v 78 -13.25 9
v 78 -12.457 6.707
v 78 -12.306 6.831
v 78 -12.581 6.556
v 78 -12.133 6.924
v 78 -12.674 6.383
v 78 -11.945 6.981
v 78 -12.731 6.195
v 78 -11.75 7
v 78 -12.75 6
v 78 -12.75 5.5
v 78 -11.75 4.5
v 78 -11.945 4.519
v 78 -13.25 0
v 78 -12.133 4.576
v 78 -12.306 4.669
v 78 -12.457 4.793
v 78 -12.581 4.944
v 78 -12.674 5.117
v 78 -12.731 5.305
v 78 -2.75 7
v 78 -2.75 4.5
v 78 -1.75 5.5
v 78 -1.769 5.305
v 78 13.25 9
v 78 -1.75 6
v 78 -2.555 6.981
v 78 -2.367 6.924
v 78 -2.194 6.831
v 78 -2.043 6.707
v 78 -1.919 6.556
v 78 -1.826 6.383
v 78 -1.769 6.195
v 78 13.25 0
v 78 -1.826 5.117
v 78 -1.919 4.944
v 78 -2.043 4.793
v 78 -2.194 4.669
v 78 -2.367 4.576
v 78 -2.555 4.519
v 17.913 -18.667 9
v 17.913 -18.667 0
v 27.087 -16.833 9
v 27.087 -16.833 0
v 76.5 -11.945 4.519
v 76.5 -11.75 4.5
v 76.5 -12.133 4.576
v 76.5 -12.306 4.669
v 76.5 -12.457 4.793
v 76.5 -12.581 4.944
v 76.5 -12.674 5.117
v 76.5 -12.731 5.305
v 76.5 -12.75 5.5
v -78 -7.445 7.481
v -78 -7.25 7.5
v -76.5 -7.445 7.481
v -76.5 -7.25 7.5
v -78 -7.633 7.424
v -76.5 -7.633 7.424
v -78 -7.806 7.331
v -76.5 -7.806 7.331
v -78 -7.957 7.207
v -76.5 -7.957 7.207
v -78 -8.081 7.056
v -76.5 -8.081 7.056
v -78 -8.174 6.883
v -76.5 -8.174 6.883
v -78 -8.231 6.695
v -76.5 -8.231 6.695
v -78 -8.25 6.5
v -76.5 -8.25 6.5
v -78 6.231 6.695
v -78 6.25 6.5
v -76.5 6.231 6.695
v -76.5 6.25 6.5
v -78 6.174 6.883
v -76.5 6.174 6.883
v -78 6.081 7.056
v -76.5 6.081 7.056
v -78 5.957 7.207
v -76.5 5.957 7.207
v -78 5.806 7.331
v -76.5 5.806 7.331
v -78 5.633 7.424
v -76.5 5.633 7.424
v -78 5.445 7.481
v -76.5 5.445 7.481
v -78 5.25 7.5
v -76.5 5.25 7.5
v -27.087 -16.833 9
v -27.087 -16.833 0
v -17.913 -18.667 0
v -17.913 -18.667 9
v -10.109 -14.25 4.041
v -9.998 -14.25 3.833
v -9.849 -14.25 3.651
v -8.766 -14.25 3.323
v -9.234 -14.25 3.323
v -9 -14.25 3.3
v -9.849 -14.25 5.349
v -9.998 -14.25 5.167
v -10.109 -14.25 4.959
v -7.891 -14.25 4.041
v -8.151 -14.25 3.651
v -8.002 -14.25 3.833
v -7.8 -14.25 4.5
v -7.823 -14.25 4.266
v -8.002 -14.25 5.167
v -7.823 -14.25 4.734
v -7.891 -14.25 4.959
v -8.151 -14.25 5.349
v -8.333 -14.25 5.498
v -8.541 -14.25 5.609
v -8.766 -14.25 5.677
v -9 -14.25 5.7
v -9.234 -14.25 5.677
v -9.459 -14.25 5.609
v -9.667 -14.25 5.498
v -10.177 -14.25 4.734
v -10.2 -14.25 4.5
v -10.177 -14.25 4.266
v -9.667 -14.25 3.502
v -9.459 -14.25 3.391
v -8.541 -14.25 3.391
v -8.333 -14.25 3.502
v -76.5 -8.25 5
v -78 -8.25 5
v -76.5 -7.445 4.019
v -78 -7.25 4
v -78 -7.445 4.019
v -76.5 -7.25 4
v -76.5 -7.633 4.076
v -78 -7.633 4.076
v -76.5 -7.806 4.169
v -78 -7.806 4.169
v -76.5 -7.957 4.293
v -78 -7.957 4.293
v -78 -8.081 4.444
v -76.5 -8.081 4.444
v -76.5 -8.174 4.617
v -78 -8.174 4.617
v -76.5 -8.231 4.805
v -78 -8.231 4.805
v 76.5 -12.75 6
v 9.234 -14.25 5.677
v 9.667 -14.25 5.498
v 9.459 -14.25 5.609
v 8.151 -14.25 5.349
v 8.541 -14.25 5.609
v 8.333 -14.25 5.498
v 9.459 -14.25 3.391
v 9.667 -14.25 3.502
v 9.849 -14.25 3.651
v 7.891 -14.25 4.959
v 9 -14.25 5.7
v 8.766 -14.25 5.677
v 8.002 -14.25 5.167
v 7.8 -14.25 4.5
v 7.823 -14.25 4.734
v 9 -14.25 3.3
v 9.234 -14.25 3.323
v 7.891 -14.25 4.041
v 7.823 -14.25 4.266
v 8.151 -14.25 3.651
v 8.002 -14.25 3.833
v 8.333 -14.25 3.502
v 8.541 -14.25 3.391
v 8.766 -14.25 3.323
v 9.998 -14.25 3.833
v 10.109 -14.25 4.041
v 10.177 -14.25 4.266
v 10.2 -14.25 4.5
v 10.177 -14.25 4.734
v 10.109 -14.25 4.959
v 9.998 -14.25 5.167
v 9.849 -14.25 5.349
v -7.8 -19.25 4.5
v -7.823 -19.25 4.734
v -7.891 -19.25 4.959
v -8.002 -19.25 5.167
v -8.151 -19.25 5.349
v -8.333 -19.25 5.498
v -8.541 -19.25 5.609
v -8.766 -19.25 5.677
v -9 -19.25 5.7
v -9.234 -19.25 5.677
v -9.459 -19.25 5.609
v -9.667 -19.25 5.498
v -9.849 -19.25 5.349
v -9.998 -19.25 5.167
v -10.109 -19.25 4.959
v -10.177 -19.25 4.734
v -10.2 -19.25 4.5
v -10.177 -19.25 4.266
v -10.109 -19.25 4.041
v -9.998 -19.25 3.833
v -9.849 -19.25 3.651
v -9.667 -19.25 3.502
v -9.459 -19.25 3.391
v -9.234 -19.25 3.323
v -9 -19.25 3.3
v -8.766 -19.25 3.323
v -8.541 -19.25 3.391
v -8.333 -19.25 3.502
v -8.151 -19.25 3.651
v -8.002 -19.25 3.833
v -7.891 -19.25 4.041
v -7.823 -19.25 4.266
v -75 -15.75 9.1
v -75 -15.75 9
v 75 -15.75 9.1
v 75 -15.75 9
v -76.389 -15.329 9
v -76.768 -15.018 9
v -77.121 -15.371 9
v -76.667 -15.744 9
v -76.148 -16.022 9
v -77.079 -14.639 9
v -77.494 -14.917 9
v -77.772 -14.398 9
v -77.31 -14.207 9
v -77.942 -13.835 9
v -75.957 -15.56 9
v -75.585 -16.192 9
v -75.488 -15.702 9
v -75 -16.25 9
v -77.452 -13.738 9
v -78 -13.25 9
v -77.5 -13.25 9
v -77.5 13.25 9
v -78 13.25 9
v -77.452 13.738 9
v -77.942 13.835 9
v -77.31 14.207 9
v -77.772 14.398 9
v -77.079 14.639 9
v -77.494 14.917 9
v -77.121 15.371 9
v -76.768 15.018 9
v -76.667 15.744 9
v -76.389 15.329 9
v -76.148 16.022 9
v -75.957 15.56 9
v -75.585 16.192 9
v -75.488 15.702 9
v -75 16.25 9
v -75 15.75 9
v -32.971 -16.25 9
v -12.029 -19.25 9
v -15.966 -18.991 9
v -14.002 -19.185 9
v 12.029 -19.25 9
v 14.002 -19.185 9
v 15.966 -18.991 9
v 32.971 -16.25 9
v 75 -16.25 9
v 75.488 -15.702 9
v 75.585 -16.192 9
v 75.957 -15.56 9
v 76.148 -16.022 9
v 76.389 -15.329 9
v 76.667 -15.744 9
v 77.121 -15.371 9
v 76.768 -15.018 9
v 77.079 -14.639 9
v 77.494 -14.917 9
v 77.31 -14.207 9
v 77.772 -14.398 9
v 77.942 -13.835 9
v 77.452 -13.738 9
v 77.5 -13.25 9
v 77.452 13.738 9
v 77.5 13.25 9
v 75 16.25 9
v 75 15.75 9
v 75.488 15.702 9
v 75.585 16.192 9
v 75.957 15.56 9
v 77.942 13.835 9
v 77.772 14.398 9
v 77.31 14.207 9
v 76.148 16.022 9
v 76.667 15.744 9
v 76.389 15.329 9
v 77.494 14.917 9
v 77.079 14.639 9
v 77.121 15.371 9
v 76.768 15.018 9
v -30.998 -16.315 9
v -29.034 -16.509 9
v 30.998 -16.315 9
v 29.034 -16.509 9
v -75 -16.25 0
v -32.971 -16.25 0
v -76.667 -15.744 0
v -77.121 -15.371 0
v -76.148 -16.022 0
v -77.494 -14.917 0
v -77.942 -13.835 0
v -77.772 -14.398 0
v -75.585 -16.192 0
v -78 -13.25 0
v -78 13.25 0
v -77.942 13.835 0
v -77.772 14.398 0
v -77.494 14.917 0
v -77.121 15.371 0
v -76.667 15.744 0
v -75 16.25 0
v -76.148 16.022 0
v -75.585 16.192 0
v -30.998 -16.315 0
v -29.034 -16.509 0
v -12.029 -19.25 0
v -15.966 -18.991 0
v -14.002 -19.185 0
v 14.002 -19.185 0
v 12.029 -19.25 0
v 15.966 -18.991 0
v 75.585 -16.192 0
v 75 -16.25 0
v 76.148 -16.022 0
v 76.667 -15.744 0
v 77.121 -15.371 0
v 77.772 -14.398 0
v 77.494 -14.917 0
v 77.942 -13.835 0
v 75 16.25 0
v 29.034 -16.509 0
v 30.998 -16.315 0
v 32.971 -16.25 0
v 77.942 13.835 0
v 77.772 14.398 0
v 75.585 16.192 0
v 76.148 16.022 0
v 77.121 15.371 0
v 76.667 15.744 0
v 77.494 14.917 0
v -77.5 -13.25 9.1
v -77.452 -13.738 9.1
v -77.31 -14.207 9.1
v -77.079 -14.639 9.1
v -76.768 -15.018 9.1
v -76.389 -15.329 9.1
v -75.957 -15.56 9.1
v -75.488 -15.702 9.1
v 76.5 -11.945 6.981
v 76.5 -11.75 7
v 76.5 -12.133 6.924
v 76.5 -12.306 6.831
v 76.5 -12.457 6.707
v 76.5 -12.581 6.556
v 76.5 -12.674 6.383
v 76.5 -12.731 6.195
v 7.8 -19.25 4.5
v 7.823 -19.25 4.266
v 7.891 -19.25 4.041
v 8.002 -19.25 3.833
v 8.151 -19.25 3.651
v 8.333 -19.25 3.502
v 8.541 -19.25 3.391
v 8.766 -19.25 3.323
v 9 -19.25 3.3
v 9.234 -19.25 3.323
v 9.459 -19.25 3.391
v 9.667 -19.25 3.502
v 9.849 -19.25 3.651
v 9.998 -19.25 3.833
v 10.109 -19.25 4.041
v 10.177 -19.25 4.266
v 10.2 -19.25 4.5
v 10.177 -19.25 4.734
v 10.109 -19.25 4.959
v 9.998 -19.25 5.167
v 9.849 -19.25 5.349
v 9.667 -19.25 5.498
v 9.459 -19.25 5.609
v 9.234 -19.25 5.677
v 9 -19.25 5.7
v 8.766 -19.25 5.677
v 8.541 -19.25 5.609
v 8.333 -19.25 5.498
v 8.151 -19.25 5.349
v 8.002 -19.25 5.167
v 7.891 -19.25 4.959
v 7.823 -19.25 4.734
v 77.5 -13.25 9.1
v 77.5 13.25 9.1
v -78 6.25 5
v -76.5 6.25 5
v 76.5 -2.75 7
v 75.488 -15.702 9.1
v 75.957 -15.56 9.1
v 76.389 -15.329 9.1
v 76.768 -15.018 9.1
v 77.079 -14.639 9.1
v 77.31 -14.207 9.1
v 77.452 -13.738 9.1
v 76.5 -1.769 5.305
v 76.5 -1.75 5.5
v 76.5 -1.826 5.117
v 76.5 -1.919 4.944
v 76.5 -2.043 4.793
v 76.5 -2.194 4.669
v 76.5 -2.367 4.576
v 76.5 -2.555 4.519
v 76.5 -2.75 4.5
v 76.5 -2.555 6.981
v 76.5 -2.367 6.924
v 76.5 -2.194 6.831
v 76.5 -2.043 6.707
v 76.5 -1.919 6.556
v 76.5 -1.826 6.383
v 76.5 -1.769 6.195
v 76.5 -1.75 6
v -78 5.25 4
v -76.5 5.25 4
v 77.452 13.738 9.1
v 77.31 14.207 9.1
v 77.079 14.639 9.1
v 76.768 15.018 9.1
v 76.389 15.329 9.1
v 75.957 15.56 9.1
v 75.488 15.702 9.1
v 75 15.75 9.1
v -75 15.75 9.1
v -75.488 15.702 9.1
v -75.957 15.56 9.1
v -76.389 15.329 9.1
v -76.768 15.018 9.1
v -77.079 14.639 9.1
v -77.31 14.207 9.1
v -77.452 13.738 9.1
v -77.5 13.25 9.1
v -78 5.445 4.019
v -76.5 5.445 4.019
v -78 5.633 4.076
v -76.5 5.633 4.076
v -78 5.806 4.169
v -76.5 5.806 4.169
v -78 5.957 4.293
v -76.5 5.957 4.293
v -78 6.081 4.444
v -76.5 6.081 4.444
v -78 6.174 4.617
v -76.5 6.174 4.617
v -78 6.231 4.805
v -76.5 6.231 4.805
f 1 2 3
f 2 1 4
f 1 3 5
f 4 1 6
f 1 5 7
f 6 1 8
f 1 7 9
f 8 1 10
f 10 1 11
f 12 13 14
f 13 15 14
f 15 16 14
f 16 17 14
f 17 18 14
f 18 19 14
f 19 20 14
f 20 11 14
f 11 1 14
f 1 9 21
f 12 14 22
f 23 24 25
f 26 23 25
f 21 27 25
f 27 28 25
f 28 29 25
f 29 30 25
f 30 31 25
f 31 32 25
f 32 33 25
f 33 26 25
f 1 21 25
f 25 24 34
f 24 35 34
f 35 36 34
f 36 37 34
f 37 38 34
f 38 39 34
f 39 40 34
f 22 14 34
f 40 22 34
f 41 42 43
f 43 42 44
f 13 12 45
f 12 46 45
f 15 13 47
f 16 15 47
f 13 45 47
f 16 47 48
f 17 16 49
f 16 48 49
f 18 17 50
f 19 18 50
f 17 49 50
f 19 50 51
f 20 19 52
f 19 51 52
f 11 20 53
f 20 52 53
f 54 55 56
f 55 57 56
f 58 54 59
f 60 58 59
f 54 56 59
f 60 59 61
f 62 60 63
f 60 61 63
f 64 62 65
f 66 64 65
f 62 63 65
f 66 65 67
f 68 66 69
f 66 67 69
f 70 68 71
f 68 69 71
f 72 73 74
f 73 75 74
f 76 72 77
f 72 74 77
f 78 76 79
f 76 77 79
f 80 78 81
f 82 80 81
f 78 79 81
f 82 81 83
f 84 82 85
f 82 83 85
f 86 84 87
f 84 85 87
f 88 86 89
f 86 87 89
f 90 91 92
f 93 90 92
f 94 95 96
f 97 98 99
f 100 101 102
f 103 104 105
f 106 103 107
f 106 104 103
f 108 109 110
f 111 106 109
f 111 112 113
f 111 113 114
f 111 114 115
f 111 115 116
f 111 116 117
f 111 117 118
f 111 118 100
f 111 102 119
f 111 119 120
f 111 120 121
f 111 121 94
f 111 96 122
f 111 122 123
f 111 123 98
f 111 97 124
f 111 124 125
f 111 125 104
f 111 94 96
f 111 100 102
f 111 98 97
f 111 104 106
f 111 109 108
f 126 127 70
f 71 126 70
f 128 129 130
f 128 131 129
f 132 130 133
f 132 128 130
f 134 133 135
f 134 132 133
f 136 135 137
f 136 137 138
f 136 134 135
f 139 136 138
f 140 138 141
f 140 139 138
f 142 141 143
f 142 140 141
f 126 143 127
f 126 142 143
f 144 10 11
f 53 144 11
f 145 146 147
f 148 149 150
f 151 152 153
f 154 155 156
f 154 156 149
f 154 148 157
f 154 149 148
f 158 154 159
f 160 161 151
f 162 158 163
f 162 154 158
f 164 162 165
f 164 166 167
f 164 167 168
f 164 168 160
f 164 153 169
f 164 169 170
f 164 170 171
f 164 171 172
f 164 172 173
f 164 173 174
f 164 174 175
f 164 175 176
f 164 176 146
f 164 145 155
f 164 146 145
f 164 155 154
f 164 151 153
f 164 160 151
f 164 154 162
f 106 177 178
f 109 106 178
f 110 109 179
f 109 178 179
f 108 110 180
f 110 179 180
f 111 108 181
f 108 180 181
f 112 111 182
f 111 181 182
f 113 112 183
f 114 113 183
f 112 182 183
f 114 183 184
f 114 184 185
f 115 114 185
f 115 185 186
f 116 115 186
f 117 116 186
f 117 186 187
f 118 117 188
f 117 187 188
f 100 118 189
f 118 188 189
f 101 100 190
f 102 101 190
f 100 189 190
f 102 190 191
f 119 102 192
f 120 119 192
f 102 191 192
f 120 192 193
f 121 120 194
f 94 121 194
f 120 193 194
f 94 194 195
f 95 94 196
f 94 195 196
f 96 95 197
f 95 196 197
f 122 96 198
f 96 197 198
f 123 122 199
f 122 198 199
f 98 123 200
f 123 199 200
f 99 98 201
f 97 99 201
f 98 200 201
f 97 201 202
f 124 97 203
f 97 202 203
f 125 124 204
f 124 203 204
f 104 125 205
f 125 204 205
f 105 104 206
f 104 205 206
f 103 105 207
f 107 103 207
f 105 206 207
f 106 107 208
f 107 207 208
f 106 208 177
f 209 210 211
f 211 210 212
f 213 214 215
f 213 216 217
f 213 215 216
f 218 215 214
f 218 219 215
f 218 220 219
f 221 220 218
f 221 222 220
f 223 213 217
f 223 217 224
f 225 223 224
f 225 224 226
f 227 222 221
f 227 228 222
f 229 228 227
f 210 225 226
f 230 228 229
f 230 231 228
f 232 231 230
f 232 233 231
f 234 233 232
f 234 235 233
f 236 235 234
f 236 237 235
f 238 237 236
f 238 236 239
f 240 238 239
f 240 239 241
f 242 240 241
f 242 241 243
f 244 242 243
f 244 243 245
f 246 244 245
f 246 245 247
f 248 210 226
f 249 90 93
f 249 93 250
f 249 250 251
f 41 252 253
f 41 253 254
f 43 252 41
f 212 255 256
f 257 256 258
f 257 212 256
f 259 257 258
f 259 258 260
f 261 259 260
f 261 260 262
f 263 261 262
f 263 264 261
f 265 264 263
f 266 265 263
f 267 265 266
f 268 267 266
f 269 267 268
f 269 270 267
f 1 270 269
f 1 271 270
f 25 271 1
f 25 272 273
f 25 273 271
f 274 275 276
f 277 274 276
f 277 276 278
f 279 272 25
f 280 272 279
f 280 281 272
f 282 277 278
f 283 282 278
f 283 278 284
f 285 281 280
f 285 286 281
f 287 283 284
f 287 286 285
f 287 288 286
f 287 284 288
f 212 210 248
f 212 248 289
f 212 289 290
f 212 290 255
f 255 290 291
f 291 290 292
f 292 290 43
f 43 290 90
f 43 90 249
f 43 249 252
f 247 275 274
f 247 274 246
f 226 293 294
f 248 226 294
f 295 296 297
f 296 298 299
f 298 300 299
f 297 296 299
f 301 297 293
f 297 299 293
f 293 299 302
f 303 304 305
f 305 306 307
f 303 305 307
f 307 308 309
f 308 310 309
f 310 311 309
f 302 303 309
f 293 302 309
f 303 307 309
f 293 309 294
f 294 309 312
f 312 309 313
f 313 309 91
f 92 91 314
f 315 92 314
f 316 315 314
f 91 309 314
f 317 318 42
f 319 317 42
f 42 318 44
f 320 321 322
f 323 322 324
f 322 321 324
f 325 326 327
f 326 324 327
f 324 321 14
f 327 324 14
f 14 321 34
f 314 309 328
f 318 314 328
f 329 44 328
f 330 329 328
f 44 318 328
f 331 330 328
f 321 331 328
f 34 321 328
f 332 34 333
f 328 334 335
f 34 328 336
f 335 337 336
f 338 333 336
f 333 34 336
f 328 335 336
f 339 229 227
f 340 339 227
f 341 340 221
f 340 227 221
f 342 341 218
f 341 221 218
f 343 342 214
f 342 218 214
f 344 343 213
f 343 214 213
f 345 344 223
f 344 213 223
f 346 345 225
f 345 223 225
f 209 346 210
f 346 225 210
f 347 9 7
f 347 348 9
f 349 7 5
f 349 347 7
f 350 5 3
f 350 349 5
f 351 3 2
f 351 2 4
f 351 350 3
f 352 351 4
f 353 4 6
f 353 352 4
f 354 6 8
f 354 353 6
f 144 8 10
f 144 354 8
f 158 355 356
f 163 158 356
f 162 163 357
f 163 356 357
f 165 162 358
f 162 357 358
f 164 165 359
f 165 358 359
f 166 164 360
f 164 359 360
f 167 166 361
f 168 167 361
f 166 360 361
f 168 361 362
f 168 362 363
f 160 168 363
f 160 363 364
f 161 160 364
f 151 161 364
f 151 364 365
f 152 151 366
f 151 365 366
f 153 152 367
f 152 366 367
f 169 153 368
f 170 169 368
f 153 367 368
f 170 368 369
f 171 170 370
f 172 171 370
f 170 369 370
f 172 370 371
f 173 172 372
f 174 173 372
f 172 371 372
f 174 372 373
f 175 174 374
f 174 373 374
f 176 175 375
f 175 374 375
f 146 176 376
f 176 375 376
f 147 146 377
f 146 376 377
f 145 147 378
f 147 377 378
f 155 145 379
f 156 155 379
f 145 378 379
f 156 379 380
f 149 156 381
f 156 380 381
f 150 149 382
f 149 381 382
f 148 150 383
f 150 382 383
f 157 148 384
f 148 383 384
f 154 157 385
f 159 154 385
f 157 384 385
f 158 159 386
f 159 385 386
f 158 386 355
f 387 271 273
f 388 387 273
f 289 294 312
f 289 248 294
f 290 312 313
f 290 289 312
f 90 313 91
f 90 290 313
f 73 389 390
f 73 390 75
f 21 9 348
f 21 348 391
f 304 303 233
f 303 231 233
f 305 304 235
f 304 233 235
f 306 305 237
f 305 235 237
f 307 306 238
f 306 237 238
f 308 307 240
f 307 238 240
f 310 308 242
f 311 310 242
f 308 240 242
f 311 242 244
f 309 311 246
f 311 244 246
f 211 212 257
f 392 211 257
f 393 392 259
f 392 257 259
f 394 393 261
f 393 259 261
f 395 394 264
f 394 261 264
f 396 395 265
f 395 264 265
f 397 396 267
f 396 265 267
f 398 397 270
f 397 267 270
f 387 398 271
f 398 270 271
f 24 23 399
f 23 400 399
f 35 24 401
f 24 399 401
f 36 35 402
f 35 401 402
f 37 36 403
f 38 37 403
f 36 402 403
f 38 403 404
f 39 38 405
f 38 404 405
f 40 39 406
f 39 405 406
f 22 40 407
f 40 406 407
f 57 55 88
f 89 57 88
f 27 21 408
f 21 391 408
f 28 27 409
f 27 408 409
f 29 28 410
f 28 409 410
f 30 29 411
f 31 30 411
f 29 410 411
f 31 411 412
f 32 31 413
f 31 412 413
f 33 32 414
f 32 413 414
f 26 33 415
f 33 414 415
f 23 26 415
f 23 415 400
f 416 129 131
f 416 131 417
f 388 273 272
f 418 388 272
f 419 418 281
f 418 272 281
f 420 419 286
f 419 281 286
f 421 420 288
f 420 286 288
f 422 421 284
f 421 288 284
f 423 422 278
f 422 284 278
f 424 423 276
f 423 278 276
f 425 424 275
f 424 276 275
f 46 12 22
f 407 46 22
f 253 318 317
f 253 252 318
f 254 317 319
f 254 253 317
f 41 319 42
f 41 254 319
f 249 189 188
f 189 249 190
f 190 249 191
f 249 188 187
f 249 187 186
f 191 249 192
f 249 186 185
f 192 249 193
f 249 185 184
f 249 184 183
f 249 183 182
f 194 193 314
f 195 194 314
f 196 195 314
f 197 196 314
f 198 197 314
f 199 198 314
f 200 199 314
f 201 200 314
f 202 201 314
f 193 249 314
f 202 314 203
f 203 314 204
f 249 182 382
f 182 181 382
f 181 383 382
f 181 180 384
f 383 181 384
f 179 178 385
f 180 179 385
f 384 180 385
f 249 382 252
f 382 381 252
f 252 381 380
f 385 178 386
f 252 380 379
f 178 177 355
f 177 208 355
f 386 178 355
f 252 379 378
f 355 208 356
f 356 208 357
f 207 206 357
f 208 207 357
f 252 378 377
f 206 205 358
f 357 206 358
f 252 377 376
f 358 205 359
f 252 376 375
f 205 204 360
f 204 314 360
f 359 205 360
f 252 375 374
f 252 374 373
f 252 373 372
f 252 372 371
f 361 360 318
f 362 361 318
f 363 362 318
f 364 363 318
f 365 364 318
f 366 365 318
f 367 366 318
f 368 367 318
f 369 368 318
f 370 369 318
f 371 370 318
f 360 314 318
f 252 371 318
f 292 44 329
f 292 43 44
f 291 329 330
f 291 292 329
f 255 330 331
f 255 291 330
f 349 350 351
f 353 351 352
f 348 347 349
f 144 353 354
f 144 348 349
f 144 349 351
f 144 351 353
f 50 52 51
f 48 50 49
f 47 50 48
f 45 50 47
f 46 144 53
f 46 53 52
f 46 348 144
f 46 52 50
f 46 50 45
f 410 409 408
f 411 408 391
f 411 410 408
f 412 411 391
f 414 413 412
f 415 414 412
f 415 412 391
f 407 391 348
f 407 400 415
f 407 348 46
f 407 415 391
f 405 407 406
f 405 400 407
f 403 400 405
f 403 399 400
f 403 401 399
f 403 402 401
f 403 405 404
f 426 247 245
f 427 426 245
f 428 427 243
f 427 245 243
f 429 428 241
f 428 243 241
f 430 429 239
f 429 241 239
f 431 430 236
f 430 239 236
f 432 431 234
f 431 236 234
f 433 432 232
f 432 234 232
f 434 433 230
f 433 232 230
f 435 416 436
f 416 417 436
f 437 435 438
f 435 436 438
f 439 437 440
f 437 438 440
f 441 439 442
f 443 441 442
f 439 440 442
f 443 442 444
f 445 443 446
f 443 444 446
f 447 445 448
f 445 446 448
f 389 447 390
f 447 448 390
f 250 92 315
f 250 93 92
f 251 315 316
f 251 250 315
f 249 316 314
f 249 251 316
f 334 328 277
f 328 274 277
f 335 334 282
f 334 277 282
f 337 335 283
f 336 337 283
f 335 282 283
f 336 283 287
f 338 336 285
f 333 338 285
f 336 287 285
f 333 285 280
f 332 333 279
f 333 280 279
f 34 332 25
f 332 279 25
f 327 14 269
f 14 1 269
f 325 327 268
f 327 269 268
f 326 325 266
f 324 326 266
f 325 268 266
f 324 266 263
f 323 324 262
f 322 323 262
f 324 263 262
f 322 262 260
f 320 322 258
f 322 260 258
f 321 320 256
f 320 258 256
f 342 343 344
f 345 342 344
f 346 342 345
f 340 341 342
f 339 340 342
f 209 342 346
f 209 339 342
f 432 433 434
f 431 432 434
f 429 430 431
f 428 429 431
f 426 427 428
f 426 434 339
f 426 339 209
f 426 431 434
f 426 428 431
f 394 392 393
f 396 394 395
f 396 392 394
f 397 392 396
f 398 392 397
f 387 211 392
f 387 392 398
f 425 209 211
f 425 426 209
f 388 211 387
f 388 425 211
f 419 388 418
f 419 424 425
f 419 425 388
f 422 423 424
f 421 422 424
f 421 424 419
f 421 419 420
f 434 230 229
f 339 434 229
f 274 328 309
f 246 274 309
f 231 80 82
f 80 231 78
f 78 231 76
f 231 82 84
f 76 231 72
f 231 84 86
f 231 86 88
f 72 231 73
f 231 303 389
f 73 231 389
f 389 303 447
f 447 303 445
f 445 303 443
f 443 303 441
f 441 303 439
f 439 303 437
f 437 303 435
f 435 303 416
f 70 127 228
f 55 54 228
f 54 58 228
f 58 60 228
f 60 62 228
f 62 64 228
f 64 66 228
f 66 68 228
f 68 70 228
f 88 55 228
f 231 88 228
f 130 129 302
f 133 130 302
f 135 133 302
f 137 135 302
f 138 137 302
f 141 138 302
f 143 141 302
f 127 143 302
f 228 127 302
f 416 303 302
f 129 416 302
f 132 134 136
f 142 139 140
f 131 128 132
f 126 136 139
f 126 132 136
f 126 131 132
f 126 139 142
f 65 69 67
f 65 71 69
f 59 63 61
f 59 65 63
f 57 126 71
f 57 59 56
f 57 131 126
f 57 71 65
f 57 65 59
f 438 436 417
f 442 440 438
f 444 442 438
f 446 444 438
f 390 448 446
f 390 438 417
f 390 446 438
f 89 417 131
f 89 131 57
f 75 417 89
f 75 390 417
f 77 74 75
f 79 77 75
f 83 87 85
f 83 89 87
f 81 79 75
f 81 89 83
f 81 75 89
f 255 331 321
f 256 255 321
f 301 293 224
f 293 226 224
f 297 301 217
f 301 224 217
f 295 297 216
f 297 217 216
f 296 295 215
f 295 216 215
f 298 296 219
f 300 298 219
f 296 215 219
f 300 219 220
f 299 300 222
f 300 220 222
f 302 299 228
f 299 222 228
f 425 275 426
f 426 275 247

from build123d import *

# Parameters (mm, degrees)
BOSS_EXTRUDE1_DEPTH = 9
FILLET1_R           = 30
FILLET2_R           = 3
BOSS_EXTRUDE2_DEPTH = 0.1
SKETCH3_R           = 1.2
CUT_EXTRUDE1_DEPTH  = 5
SKETCH4_W           = 3.5
SKETCH4_H           = 14.5
CUT_EXTRUDE2_DEPTH  = 1.5
SKETCH5_W           = 2.5
SKETCH5_H           = 11
CUT_EXTRUDE4_DEPTH  = 1.5
FILLET3_R           = 1


with BuildPart() as part:
    # Sketch1 → Boss-Extrude1 (new body)
    with BuildSketch(Plane.XY):
        Polygon((78, -16.25), (78, 16.25), (-78, 16.25), (-78, -16.25), (-30, -16.25), (-15, -19.25), (15, -19.25), (30, -16.25), align=None)
    extrude(amount=BOSS_EXTRUDE1_DEPTH)

    # Fillet1
    fillet1_edges = [part.edges().sort_by_distance(p)[0] for p in [
        (30, -16.25, 4.5),
        (15, -19.25, 4.5),
        (-15, -19.25, 4.5),
        (-30, -16.25, 4.5),
    ]]
    fillet(fillet1_edges, radius=FILLET1_R)

    # Fillet2
    fillet2_edges = [part.edges().sort_by_distance(p)[0] for p in [
        (-78, 16.25, 4.5),
        (78, 16.25, 4.5),
        (78, -16.25, 4.5),
        (-78, -16.25, 4.5),
    ]]
    fillet(fillet2_edges, radius=FILLET2_R)

    # Sketch2 → Boss-Extrude2 (add)
    with BuildSketch(Plane.XY.offset(9)):
        with BuildLine():
            Line((-32.970585408, -15.75), (32.970585408, -15.75))
            Line((32.970585408, -15.75), (75, -15.75))
            ThreePointArc((75, -15.75), (76.767766953, -15.017766953), (77.5, -13.25))
            Line((77.5, -13.25), (77.5, 13.25))
            ThreePointArc((77.5, 13.25), (76.767766953, 15.017766953), (75, 15.75))
            Line((75, 15.75), (-75, 15.75))
            ThreePointArc((-75, 15.75), (-76.767766953, 15.017766953), (-77.5, 13.25))
            Line((-77.5, 13.25), (-77.5, -13.25))
            ThreePointArc((-77.5, -13.25), (-76.767766953, -15.017766953), (-75, -15.75))
            Line((-75, -15.75), (-32.970585408, -15.75))
        make_face()
    extrude(amount=BOSS_EXTRUDE2_DEPTH)

    # Sketch3 → Cut-Extrude1 (cut)
    with BuildSketch(Plane.XZ.offset(19.25)):
        with Locations((-9, 4.5)):
            Circle(SKETCH3_R)
        with Locations(Location((9, 4.5, 0), (0, 0, 180))):
            Circle(SKETCH3_R)
    extrude(amount=-CUT_EXTRUDE1_DEPTH, mode=Mode.SUBTRACT)

    # Sketch4 → Cut-Extrude2 (cut)
    with BuildSketch(Plane.ZY.offset(78)):
        with Locations((5.75, -1)):
            Rectangle(SKETCH4_W, SKETCH4_H)
    extrude(amount=-CUT_EXTRUDE2_DEPTH, mode=Mode.SUBTRACT)

    # Sketch5 → Cut-Extrude4 (cut)
    with BuildSketch(Plane(origin=(78, 0, 0), x_dir=(0, 0, -1), z_dir=(1, 0, 0))):
        with Locations((-5.75, -7.25)):
            Rectangle(SKETCH5_W, SKETCH5_H)
    extrude(amount=-CUT_EXTRUDE4_DEPTH, mode=Mode.SUBTRACT)

    # Fillet3
    fillet3_edges = [part.edges().sort_by_distance(p)[0] for p in [
        (-77.25, -8.25, 4),
        (-77.25, 6.25, 4),
        (-77.25, 6.25, 7.5),
        (-77.25, -8.25, 7.5),
        (77.25, -12.75, 7),
        (77.25, -1.75, 7),
        (77.25, -1.75, 4.5),
        (77.25, -12.75, 4.5),
    ]]
    fillet(fillet3_edges, radius=FILLET3_R)


solid = part.part
